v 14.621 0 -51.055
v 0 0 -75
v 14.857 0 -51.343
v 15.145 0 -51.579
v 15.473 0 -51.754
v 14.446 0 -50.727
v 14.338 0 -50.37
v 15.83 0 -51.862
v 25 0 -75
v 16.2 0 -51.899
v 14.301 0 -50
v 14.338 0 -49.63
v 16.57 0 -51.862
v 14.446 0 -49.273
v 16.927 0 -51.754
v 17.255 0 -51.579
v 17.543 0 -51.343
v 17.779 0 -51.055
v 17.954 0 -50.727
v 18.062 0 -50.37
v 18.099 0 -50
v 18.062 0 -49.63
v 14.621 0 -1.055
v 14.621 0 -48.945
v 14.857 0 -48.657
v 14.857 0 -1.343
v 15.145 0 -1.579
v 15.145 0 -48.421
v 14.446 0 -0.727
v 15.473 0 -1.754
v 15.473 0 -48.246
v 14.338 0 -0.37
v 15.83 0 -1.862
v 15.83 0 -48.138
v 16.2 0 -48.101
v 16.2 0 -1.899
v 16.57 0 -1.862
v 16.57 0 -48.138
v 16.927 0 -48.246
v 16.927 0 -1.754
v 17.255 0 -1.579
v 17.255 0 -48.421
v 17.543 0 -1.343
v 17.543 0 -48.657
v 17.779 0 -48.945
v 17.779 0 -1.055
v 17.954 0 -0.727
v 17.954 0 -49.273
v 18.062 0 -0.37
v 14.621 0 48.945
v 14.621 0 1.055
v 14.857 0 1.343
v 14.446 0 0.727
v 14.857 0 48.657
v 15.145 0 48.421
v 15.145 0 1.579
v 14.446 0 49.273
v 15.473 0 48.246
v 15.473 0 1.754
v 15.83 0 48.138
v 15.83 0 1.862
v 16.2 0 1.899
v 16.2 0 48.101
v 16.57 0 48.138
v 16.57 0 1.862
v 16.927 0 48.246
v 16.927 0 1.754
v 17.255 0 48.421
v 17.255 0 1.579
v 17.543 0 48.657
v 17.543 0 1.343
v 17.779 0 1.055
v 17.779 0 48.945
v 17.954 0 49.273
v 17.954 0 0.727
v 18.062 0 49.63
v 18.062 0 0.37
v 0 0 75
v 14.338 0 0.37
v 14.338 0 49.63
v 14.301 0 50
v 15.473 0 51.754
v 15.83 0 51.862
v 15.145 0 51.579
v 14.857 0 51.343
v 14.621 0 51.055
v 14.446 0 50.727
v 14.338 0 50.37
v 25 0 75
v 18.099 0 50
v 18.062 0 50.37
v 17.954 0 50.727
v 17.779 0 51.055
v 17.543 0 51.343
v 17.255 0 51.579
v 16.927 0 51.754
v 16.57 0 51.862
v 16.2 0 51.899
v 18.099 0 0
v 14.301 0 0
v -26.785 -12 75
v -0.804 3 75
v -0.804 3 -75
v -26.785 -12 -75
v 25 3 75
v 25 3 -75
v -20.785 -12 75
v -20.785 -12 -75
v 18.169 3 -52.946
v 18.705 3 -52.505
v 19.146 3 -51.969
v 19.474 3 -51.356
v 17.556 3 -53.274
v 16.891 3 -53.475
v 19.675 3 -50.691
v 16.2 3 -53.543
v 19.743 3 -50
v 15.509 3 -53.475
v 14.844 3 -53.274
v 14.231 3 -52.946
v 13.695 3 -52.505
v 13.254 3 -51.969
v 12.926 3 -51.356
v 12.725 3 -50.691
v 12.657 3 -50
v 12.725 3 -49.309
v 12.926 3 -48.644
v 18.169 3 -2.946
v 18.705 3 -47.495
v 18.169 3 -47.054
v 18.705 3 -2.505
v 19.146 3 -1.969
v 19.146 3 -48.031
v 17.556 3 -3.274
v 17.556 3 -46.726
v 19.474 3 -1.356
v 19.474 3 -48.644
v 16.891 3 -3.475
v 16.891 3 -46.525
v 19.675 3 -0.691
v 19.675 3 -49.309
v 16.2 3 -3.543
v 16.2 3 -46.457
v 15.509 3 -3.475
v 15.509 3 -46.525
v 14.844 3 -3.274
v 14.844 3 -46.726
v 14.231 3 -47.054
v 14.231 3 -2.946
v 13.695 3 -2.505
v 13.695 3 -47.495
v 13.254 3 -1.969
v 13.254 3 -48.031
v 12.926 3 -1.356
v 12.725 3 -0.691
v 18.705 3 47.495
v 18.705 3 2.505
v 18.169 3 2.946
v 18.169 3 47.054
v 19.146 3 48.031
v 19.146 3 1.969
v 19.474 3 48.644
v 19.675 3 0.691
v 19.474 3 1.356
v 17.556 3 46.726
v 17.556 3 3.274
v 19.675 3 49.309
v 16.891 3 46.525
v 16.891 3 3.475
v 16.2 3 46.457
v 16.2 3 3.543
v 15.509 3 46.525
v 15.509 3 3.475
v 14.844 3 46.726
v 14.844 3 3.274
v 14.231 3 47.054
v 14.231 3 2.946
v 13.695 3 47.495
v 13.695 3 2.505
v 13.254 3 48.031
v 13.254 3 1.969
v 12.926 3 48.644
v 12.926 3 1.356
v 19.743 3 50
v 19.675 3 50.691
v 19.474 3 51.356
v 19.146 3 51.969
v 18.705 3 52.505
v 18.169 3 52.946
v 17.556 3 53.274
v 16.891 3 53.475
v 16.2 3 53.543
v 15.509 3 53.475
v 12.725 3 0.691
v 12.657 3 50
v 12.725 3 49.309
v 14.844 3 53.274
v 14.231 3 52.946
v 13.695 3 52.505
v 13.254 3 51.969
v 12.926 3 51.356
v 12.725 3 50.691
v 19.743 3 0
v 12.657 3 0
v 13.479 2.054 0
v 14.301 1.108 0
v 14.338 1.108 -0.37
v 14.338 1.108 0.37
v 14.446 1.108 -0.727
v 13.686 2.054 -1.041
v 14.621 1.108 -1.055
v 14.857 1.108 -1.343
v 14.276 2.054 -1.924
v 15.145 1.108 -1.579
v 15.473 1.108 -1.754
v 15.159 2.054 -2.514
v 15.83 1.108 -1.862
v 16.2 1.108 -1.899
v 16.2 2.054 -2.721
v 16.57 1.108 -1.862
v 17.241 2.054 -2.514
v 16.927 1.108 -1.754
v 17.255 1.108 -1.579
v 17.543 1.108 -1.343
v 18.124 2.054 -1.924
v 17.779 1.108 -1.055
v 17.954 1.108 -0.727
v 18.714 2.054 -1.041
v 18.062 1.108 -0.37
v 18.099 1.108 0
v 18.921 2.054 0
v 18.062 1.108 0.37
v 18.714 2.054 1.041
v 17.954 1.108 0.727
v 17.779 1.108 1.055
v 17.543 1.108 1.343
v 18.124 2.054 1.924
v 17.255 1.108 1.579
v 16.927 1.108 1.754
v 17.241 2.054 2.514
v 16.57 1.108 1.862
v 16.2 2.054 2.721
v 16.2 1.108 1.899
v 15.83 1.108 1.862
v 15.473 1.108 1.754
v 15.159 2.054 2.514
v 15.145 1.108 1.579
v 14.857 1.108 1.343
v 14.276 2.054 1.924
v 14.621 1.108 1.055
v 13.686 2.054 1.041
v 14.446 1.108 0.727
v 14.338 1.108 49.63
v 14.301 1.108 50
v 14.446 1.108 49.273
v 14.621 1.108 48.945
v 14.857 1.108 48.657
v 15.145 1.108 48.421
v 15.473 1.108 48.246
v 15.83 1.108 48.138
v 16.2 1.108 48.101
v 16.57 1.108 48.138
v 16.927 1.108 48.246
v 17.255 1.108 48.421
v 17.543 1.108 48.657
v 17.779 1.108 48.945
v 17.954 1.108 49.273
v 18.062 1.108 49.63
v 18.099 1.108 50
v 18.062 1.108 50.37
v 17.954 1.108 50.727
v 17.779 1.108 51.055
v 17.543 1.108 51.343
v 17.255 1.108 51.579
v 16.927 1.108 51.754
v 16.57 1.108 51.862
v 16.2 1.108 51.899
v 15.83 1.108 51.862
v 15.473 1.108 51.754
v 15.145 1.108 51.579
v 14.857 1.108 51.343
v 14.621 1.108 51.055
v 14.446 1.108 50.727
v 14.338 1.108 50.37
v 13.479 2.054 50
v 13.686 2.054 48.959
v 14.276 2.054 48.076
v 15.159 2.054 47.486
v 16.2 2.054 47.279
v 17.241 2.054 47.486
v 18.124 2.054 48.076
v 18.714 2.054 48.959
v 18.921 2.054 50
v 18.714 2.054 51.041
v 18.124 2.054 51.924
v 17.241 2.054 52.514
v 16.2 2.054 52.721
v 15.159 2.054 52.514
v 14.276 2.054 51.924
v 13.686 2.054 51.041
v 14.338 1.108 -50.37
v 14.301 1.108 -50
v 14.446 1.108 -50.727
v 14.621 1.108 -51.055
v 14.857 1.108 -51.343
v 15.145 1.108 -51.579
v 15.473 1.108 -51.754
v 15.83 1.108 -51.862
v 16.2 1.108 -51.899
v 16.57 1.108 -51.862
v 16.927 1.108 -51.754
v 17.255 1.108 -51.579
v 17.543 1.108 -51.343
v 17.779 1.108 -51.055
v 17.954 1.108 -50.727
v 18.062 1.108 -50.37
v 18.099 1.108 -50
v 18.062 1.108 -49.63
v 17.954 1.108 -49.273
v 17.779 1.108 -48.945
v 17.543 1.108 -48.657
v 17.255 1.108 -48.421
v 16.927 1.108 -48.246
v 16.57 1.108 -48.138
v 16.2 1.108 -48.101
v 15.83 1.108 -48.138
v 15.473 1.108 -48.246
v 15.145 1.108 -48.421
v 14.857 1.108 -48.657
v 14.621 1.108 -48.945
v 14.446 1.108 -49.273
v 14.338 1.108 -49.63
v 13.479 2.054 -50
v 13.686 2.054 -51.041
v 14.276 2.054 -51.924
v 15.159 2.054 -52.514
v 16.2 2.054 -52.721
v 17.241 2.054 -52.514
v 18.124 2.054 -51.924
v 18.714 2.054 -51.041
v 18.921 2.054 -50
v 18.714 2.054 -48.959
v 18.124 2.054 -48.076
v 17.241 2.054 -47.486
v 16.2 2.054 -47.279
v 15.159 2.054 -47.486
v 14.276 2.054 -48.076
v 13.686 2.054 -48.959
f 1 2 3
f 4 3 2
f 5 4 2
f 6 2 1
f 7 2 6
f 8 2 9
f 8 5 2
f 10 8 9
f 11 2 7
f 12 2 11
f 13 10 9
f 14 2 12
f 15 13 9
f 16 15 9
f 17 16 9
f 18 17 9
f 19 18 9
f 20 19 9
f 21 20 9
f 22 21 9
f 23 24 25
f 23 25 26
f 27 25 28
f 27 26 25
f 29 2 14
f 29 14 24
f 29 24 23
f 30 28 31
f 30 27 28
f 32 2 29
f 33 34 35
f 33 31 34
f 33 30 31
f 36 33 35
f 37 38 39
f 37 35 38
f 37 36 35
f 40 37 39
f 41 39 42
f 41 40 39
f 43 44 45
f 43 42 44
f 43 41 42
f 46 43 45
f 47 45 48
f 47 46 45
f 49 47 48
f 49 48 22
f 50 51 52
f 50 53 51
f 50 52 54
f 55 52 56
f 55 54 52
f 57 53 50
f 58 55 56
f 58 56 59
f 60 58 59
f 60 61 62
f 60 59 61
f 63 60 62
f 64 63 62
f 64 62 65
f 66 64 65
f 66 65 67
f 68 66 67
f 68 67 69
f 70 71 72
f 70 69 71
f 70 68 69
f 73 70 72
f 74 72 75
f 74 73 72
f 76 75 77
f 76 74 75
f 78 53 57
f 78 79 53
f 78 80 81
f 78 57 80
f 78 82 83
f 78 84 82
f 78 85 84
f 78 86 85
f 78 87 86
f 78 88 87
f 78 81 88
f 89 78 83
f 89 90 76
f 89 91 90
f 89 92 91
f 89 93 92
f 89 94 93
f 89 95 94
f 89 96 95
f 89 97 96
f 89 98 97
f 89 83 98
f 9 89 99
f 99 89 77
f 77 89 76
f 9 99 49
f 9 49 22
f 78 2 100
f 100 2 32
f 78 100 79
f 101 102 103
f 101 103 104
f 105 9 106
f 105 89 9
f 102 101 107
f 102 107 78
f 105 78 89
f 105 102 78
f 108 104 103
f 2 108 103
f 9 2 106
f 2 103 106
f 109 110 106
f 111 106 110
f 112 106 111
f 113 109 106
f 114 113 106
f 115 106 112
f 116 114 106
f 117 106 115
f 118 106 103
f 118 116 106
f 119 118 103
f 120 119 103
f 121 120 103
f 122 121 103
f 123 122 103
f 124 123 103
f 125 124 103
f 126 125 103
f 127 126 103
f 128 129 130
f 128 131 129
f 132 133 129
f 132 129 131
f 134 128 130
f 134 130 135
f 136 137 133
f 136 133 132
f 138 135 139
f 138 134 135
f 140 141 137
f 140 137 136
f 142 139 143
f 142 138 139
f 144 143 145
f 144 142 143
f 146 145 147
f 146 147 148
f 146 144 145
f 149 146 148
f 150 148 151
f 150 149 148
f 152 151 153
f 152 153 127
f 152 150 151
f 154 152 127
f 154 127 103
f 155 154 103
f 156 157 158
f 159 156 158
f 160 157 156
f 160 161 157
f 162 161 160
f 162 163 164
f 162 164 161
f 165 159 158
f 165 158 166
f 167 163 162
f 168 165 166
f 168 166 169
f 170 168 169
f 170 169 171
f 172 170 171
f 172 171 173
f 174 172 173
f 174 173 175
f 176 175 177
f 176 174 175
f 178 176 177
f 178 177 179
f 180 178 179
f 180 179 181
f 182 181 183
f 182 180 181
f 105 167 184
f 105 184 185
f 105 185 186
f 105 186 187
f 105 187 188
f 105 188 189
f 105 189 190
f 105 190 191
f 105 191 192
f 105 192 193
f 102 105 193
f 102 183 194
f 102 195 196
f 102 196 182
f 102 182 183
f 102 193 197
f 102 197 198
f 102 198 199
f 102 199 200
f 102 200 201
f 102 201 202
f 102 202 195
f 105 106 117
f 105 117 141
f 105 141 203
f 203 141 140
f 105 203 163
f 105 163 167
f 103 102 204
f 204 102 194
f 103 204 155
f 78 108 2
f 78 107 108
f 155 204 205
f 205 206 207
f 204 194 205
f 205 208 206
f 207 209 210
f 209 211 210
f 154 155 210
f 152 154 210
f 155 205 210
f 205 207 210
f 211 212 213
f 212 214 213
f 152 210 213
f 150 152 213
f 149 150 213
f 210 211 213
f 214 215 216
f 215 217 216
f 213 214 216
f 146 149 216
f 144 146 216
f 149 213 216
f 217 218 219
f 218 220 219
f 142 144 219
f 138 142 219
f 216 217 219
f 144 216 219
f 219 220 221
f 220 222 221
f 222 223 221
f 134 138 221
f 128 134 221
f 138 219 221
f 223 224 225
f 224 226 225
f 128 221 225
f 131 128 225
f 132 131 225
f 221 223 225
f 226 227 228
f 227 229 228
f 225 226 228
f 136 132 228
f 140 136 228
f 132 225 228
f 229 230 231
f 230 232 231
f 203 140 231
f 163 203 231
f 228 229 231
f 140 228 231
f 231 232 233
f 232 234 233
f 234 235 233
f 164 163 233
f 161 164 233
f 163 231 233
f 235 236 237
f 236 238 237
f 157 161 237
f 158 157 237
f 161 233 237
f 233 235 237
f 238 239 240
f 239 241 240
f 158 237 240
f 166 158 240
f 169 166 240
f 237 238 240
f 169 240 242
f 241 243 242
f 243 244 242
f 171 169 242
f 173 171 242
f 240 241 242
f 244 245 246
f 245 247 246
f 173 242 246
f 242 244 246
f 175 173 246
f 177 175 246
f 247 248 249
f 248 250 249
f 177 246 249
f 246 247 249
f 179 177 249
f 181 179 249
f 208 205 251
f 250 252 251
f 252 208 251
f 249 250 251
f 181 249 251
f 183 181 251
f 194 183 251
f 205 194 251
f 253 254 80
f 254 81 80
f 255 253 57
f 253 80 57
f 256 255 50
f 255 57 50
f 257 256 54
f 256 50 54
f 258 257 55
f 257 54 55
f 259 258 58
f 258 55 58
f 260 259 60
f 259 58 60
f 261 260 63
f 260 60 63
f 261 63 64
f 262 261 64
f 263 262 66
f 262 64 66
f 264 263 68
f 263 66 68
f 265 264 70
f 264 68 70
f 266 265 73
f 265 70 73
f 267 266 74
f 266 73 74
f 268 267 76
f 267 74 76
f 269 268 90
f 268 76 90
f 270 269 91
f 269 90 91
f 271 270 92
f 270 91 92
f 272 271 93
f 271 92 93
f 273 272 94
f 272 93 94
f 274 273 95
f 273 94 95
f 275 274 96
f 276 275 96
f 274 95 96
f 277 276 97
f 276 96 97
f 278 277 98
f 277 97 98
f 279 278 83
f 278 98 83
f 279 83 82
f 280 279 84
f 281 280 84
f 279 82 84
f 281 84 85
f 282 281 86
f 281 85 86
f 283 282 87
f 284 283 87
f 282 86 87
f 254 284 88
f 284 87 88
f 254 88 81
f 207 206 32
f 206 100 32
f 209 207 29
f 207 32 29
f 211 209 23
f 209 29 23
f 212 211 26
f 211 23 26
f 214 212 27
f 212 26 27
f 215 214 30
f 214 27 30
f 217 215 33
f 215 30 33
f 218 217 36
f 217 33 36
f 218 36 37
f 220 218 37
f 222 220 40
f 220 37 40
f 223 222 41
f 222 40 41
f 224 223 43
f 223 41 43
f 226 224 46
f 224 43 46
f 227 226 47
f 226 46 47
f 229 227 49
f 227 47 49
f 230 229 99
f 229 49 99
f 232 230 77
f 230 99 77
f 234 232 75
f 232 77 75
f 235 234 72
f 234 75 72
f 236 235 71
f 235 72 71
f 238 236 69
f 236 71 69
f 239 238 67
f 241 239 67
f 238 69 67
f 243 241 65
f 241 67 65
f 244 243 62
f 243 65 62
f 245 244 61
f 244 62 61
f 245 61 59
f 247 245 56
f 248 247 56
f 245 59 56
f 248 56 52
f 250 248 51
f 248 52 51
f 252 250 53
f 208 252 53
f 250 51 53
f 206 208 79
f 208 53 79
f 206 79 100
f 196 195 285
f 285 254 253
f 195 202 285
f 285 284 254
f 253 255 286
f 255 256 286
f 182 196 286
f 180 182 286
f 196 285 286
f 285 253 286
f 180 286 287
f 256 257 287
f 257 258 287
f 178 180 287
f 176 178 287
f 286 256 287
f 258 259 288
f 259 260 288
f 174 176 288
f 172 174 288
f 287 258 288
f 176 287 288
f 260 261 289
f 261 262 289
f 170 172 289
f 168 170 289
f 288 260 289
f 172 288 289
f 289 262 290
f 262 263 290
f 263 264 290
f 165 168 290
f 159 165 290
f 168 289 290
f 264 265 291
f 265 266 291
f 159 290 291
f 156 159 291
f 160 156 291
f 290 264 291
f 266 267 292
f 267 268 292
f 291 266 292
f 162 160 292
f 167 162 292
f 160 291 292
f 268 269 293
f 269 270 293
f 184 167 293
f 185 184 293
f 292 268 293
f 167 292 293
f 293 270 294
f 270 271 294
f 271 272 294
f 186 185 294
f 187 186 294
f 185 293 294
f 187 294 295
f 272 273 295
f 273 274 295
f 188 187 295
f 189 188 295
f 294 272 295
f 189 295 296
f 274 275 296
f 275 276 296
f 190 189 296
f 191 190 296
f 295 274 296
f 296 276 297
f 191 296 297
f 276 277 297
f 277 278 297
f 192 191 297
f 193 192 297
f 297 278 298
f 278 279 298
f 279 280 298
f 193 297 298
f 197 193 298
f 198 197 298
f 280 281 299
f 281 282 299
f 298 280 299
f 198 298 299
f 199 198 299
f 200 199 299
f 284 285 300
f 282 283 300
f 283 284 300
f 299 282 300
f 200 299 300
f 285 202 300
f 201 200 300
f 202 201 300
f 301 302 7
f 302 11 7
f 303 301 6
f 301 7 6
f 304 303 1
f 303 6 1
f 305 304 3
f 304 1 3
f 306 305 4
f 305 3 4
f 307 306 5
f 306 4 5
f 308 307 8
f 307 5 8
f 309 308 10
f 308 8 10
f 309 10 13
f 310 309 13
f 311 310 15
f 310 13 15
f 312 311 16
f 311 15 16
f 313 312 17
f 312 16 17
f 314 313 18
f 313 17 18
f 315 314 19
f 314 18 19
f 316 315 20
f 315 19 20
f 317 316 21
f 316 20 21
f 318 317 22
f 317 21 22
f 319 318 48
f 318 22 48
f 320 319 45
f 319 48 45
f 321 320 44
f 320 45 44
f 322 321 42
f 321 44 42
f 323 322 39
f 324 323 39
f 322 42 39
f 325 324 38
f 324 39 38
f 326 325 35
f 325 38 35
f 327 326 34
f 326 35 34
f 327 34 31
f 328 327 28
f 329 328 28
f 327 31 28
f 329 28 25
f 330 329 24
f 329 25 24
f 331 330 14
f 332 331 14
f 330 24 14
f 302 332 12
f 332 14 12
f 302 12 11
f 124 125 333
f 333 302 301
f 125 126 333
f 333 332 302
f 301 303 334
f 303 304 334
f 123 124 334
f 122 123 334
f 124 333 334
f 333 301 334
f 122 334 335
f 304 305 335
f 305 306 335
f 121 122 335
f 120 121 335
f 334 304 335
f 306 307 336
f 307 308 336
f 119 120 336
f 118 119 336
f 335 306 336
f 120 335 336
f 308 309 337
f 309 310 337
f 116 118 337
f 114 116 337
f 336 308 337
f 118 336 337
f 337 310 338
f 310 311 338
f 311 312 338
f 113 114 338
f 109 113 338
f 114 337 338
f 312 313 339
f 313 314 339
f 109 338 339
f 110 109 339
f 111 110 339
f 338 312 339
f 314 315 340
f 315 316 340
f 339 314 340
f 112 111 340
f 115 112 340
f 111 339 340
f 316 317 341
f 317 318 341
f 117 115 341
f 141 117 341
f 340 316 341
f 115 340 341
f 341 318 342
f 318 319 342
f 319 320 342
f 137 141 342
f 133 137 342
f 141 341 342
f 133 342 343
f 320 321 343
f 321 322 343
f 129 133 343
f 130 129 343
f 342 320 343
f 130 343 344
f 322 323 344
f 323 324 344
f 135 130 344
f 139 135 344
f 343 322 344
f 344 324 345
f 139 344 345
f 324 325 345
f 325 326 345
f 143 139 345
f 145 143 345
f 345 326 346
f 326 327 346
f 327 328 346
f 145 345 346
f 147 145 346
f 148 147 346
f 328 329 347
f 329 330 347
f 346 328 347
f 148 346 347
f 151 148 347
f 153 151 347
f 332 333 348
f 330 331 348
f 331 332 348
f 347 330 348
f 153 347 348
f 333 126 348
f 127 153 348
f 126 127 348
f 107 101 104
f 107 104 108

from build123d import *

# Parameters (mm, degrees)
SALIENTE_EXTRUIR1_DEPTH                              = 75
AVELLANADO_PARA_TORNILLO_CON_CABEZA_OVAL_D           = 3.7973
AVELLANADO_PARA_TORNILLO_CON_CABEZA_OVAL_DEPTH       = 20
AVELLANADO_PARA_TORNILLO_CON_CABEZA_OVAL_CSINK_D     = 7.0866
AVELLANADO_PARA_TORNILLO_CON_CABEZA_OVAL_CSINK_ANGLE = 82
AVELLANADO_PARA_TORNILLO_CON_CABEZA_OVAL_TIP         = 1.140824014


with BuildPart() as part:
    # Croquis1 → Saliente-Extruir1 (new body, symmetric)
    with BuildSketch(Plane.XY):
        Polygon((25, 0), (25, 3), (-0.803847577, 3), (-26.784609691, -12), (-20.784609691, -12), (0, 0), align=None)
    extrude(amount=SALIENTE_EXTRUIR1_DEPTH, both=True)

    # Avellanado para tornillo con cabeza ovalada de #61
    with Locations(Plane(origin=(16.2, 3, -50), x_dir=(1, 0, 0), z_dir=(0, 1, 0))):
        with Locations((0, 0), (0, -50), (0, -100)):
            CounterSinkHole(AVELLANADO_PARA_TORNILLO_CON_CABEZA_OVAL_D / 2, AVELLANADO_PARA_TORNILLO_CON_CABEZA_OVAL_CSINK_D / 2, depth=AVELLANADO_PARA_TORNILLO_CON_CABEZA_OVAL_DEPTH, counter_sink_angle=AVELLANADO_PARA_TORNILLO_CON_CABEZA_OVAL_CSINK_ANGLE)
            with Locations((0, 0, -(AVELLANADO_PARA_TORNILLO_CON_CABEZA_OVAL_DEPTH + AVELLANADO_PARA_TORNILLO_CON_CABEZA_OVAL_TIP / 2))):  # 118° drill point
                Cone(0, AVELLANADO_PARA_TORNILLO_CON_CABEZA_OVAL_D / 2, AVELLANADO_PARA_TORNILLO_CON_CABEZA_OVAL_TIP, mode=Mode.SUBTRACT)


solid = part.part
